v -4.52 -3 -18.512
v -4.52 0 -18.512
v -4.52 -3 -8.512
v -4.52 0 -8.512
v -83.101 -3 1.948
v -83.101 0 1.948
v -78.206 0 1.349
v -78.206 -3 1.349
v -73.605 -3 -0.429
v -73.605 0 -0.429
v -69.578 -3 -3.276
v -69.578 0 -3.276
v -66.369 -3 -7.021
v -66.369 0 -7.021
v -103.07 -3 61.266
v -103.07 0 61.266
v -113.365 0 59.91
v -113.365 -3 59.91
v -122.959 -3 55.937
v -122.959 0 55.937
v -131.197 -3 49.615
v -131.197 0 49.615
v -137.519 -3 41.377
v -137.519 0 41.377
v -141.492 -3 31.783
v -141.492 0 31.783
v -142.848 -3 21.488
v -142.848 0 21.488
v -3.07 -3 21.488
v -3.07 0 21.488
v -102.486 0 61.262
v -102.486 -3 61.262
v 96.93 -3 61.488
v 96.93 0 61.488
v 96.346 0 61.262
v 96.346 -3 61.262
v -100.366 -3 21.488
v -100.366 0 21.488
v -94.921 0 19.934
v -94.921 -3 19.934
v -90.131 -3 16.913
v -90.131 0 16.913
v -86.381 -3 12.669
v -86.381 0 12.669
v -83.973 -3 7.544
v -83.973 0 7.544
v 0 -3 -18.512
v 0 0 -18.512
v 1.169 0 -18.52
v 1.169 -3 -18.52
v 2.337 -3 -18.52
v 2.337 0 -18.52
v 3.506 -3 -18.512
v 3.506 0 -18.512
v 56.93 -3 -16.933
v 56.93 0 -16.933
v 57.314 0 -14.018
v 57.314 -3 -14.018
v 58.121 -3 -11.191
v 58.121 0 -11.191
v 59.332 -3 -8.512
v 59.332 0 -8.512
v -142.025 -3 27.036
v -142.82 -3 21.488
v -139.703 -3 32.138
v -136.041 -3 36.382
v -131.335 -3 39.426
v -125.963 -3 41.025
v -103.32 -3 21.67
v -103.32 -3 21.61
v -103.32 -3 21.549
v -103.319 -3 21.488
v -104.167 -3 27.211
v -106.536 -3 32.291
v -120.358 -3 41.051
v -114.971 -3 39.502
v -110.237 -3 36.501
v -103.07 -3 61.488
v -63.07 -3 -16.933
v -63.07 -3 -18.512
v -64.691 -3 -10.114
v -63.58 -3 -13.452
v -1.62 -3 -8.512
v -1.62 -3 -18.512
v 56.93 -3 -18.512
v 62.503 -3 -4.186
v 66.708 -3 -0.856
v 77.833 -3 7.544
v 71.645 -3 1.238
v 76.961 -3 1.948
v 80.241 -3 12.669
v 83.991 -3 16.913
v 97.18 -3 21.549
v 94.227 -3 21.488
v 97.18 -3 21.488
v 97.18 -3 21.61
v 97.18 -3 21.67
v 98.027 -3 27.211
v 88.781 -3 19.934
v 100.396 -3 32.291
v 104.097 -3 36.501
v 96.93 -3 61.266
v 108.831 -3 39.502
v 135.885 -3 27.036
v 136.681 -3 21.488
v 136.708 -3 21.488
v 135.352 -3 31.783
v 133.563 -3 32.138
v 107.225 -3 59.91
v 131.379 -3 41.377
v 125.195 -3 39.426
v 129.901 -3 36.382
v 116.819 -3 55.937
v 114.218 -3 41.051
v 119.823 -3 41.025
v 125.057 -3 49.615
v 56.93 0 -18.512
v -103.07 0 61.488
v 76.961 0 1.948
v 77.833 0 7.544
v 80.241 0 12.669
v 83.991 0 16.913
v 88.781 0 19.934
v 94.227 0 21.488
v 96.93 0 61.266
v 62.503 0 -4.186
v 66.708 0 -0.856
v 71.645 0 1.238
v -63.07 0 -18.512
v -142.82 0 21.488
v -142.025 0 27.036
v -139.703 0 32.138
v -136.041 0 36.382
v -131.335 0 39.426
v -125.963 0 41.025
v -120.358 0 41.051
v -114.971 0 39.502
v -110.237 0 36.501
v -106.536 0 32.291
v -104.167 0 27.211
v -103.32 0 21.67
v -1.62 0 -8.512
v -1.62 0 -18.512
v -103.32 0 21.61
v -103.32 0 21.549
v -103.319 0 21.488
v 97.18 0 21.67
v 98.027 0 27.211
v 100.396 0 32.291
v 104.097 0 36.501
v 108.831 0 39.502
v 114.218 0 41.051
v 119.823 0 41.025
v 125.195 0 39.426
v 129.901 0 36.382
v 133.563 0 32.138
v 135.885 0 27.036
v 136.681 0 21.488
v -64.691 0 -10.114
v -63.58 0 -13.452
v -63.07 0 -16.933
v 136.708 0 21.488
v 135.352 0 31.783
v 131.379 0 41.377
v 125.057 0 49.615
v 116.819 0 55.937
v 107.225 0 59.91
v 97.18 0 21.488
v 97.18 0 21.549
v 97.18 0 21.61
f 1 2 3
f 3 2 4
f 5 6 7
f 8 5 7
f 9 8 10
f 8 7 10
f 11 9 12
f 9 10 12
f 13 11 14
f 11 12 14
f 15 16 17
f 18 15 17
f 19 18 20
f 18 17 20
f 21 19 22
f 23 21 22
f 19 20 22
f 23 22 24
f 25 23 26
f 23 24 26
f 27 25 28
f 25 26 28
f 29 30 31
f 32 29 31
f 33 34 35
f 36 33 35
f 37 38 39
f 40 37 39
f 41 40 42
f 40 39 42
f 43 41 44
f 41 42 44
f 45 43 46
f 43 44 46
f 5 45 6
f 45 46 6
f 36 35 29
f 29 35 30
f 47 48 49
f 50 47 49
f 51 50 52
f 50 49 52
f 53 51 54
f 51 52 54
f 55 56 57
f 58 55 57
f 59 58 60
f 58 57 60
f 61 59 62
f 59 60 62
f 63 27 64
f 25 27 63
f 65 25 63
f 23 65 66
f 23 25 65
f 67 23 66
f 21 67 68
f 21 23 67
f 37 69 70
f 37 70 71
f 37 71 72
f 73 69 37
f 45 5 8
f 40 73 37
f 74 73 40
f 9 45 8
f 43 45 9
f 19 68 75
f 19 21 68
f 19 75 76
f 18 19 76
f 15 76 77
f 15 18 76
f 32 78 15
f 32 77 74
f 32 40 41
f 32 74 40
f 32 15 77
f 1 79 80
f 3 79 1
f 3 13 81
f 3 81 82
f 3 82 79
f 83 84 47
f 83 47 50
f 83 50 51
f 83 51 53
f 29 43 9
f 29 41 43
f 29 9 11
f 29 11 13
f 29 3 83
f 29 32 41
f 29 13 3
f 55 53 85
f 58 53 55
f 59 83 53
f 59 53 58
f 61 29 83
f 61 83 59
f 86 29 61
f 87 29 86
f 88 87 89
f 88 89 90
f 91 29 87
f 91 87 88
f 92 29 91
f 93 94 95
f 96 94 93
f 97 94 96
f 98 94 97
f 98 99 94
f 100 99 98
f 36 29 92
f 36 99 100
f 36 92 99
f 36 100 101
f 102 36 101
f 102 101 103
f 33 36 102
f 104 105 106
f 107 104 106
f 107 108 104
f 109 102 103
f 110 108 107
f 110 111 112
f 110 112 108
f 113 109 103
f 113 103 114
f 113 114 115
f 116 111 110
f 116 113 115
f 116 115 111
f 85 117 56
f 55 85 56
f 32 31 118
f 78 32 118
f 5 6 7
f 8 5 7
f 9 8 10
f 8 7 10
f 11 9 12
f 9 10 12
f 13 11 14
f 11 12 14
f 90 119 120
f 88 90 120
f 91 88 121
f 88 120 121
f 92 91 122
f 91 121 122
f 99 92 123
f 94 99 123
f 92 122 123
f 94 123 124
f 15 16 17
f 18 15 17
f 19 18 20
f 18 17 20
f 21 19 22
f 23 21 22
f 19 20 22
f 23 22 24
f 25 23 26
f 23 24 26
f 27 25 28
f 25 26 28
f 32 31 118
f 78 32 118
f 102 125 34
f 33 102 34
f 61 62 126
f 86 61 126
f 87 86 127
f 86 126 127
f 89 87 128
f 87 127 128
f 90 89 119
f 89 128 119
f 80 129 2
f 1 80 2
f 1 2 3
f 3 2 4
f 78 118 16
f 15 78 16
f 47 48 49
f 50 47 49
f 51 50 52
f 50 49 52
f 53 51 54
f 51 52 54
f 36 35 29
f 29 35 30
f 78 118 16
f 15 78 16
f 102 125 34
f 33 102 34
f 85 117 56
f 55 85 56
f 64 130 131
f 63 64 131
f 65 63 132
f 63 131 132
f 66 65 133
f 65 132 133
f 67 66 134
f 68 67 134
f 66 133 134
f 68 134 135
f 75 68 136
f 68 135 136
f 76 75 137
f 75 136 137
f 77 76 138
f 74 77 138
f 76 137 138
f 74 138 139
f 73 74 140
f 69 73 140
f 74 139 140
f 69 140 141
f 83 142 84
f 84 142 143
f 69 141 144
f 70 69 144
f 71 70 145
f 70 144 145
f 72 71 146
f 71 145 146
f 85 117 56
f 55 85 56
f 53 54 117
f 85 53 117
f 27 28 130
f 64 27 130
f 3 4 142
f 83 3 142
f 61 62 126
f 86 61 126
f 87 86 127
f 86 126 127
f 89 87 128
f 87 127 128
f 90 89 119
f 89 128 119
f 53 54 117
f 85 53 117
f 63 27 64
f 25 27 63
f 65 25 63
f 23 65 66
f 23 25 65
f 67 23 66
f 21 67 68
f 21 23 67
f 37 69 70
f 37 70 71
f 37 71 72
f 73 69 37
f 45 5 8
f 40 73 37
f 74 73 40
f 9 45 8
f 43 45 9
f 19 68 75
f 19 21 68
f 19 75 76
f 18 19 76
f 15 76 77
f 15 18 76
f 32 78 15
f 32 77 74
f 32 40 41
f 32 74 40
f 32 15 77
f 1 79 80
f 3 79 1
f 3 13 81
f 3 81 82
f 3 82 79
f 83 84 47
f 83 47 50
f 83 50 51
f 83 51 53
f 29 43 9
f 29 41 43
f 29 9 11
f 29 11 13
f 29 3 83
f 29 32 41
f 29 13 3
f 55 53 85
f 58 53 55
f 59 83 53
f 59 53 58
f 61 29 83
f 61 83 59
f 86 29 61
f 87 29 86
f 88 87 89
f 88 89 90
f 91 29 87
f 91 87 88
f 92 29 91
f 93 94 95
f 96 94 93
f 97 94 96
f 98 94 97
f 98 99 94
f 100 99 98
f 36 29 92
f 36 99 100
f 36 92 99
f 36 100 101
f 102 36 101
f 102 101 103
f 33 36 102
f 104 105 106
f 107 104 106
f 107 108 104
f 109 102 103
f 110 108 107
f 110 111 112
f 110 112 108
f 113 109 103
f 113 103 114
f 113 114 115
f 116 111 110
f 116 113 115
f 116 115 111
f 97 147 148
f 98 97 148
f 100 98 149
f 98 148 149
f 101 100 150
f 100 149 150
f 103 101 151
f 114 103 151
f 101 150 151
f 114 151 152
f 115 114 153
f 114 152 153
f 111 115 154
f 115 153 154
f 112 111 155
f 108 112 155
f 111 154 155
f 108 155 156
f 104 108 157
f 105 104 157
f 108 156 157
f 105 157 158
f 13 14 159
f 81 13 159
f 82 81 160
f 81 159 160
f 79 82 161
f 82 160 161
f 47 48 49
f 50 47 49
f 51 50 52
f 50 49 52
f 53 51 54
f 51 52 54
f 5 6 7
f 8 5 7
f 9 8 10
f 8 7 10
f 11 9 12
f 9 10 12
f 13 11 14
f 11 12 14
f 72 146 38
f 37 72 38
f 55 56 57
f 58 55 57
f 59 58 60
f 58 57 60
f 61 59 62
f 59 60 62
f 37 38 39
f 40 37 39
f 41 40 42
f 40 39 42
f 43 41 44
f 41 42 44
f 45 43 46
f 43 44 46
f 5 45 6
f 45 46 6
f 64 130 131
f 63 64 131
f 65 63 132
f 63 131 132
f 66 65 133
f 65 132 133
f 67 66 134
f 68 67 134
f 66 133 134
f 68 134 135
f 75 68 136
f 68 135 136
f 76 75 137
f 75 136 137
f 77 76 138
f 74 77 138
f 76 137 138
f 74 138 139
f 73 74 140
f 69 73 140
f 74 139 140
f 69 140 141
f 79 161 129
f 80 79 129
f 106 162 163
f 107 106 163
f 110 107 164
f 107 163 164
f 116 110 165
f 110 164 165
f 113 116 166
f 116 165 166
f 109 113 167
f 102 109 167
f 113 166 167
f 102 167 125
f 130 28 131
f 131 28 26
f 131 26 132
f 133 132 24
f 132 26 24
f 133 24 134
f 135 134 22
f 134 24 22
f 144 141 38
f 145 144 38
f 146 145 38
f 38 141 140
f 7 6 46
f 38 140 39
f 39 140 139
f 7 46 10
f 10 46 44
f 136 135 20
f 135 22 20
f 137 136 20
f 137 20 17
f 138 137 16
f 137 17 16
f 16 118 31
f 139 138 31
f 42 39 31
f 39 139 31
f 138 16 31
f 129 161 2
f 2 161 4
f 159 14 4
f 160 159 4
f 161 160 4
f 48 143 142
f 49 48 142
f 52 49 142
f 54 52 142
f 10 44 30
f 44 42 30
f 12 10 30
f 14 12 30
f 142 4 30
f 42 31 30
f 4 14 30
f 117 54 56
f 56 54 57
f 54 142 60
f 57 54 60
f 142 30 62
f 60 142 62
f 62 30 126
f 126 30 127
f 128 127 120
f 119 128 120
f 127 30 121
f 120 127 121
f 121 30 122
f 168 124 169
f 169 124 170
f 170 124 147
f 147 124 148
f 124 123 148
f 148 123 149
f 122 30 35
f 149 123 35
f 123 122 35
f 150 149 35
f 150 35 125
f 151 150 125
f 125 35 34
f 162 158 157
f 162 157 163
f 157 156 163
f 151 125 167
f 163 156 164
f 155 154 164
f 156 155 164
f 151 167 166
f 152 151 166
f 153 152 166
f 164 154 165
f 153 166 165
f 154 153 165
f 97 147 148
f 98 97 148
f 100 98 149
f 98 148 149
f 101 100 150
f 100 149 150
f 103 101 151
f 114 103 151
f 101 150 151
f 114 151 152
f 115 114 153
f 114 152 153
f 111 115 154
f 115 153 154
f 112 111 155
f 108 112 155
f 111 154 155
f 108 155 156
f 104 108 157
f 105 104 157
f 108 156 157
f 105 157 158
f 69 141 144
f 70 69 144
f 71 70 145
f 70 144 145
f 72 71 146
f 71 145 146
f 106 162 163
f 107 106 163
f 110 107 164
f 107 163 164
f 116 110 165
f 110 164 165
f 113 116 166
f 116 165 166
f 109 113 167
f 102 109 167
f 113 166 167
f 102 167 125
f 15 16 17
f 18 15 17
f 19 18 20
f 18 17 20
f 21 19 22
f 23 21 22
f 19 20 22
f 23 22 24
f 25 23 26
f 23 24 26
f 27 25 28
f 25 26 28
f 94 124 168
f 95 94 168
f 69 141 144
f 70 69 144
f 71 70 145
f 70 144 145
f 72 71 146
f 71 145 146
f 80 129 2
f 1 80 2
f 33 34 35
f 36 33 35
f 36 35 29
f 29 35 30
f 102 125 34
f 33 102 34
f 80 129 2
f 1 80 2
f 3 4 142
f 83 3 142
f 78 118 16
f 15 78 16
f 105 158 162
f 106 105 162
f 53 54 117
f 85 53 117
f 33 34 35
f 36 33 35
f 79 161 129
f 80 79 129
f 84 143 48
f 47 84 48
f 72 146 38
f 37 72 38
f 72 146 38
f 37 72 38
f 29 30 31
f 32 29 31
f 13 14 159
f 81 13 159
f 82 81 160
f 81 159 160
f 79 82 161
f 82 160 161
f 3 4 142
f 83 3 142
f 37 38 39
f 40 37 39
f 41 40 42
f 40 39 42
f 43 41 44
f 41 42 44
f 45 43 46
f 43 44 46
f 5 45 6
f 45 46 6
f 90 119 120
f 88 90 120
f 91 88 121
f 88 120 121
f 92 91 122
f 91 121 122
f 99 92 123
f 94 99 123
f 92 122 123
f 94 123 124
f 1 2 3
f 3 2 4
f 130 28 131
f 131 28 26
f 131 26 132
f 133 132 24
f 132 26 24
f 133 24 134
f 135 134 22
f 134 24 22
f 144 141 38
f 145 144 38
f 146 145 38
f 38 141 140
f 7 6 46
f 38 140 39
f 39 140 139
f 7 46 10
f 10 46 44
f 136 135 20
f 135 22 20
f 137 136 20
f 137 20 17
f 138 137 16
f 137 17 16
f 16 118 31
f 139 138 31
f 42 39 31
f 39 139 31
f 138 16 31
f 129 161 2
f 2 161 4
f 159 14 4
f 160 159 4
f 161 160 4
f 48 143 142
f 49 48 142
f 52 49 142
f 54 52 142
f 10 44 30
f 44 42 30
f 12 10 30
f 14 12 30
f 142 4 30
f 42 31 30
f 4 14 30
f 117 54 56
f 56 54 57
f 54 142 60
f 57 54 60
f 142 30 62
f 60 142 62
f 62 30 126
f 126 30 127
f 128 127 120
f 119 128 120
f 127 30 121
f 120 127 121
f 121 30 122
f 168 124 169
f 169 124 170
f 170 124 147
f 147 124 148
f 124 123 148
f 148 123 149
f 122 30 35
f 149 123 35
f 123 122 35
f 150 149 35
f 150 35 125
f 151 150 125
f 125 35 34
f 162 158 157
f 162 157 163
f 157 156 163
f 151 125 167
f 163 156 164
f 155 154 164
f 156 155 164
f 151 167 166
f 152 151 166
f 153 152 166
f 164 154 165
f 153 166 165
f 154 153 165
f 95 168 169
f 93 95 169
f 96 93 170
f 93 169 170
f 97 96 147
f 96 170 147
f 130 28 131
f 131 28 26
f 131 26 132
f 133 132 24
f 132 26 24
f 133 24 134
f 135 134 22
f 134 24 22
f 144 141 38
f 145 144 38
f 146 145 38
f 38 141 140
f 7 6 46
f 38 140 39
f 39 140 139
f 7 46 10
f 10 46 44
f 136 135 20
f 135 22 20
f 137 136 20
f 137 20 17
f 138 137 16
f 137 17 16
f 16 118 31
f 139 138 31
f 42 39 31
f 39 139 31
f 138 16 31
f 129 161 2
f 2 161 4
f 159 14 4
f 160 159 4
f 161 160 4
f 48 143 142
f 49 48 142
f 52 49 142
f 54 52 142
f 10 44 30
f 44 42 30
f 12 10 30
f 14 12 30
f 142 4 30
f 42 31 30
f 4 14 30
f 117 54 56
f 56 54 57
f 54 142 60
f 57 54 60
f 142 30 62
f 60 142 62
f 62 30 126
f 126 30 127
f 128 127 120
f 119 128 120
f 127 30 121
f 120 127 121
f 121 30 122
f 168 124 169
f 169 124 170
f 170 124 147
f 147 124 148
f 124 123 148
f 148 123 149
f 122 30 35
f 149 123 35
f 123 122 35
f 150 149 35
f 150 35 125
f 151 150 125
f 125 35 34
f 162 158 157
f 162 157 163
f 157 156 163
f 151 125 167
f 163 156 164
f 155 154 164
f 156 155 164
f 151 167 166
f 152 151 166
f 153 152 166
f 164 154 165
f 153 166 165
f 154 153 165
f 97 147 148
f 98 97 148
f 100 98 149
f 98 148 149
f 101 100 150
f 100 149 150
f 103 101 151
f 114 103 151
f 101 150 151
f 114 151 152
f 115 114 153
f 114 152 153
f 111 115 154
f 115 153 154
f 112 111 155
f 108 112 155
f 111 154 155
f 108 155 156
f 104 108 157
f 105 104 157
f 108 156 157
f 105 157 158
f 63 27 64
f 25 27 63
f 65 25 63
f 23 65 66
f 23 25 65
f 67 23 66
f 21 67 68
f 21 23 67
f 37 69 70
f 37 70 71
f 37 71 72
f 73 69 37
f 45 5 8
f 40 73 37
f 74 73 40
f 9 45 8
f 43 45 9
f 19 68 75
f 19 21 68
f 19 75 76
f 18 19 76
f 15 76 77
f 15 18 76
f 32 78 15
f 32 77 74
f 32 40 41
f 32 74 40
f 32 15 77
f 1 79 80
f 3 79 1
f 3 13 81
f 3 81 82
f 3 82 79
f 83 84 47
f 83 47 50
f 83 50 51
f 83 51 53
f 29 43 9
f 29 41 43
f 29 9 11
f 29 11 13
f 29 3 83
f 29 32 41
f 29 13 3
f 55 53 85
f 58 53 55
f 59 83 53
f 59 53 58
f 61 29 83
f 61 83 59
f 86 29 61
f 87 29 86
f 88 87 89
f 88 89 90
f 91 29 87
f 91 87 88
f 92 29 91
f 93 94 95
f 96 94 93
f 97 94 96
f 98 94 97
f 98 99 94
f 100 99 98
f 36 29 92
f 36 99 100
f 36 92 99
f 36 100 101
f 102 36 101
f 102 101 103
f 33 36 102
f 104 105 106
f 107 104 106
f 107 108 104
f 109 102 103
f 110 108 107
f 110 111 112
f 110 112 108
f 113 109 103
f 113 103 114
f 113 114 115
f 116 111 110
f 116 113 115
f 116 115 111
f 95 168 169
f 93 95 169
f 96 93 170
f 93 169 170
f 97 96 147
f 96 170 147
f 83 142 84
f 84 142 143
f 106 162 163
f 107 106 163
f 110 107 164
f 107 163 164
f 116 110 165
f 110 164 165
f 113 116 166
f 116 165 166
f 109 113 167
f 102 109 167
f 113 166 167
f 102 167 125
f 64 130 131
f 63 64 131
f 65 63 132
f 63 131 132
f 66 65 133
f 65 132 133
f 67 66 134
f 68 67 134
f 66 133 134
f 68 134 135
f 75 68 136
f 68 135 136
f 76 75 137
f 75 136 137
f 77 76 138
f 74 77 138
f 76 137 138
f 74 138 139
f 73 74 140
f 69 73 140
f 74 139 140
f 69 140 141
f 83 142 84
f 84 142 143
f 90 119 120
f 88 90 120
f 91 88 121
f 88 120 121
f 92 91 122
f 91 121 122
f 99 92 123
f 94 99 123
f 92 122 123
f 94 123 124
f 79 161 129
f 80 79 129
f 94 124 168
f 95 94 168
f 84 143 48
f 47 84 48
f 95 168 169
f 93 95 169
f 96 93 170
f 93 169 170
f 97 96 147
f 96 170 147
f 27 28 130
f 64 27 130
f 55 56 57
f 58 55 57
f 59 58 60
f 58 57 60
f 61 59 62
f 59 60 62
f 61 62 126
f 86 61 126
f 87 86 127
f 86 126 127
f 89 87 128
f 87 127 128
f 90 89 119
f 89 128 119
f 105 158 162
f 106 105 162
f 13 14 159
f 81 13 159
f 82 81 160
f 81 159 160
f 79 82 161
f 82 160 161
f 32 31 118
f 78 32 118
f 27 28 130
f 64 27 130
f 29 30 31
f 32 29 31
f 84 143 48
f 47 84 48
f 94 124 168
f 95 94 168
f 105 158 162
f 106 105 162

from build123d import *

# Parameters (mm, degrees)
F1_DEPTH = 3
F2_DEPTH = 3
F3_DEPTH = 3


with BuildPart() as f1:
    # F0 (on Front) → F1 (new body)
    with BuildSketch(Plane.XZ):
        with BuildLine():
            Line((-63.069923, -8.252302), (-63.069923, 21.488009))
            Line((-63.069923, 21.488009), (-3.069923, 21.488009))
            Line((-3.069923, 21.488009), (-102.48633, 61.261525))
            ThreePointArc((-102.48633, 61.261525), (-102.778119, 61.264736), (-103.069923, 61.265806))
            ThreePointArc((-103.069923, 61.265806), (-131.197073, 49.615159), (-142.84772, 21.488009))
            Line((-142.84772, 21.488009), (-142.820399, 21.488009))
            ThreePointArc((-142.820399, 21.488009), (-123.16106, 41.238275), (-103.320288, 21.670281))
            ThreePointArc((-103.320288, 21.670281), (-103.195108, 21.671458), (-103.069923, 21.67185))
            ThreePointArc((-103.069923, 21.67185), (-101.715046, 21.625837), (-100.366413, 21.488009))
            ThreePointArc((-100.366413, 21.488009), (-88.104601, 14.924745), (-83.101084, 1.948101))
            ThreePointArc((-83.101084, 1.948101), (-73.605168, -0.428708), (-66.369074, -7.021171))
            ThreePointArc((-66.369074, -7.021171), (-64.722646, -7.64517), (-63.069923, -8.252302))
        make_face()
        with BuildLine():
            Line((-3.069923, 21.488009), (-63.069923, 21.488009))
            Line((-63.069923, 21.488009), (-63.069923, -8.252302))
            ThreePointArc((-63.069923, -8.252302), (-34.240975, -15.927676), (-4.519923, -18.511991))
            Line((-4.519923, -18.511991), (-4.519923, -8.511991))
            Line((-4.519923, -8.511991), (-3.069923, -8.511991))
            Line((-3.069923, -8.511991), (-3.069923, 21.488009))
        make_face()
        with BuildLine():
            Line((96.346485, 61.261525), (-3.069923, 21.488009))
            Line((-3.069923, 21.488009), (56.930077, 21.488009))
            Line((56.930077, 21.488009), (56.930077, -9.352978))
            ThreePointArc((56.930077, -9.352978), (58.132721, -8.936963), (59.33223, -8.511991))
            ThreePointArc((59.33223, -8.511991), (66.707529, -0.856368), (76.961238, 1.948101))
            ThreePointArc((76.961238, 1.948101), (81.964756, 14.924745), (94.226567, 21.488009))
            ThreePointArc((94.226567, 21.488009), (95.5752, 21.625837), (96.930077, 21.67185))
            ThreePointArc((96.930077, 21.67185), (97.055262, 21.671458), (97.180442, 21.670281))
            ThreePointArc((97.180442, 21.670281), (117.021214, 41.238275), (136.680553, 21.488009))
            Line((136.680553, 21.488009), (136.707874, 21.488009))
            ThreePointArc((136.707874, 21.488009), (125.057227, 49.615159), (96.930077, 61.265806))
            ThreePointArc((96.930077, 61.265806), (96.638273, 61.264736), (96.346485, 61.261525))
        make_face()
        with BuildLine():
            Line((56.930077, 21.488009), (-3.069923, 21.488009))
            Line((-3.069923, 21.488009), (-3.069923, -8.511991))
            Line((-3.069923, -8.511991), (-1.619923, -8.511991))
            Line((-1.619923, -8.511991), (-1.619923, -18.511991))
            Line((-1.619923, -18.511991), (0, -18.511991))
            Line((0, -18.511991), (3.505662, -18.511991))
            ThreePointArc((3.505662, -18.511991), (30.583896, -16.067511), (56.930077, -9.352978))
            Line((56.930077, -9.352978), (56.930077, 21.488009))
        make_face()
        with BuildLine():
            ThreePointArc((-4.519923, -18.511991), (-34.240975, -15.927676), (-63.069923, -8.252302))
            Line((-63.069923, -8.252302), (-63.069923, -16.932933))
            ThreePointArc((-63.069923, -16.932933), (-63.040054, -17.72218), (-63.041318, -18.511991))
            Line((-63.041318, -18.511991), (-4.519923, -18.511991))
        make_face()
        with BuildLine():
            Line((-63.069923, -16.932933), (-63.069923, -8.252302))
            ThreePointArc((-63.069923, -8.252302), (-64.722646, -7.64517), (-66.369074, -7.021171))
            ThreePointArc((-66.369074, -7.021171), (-64.062061, -11.758223), (-63.069923, -16.932933))
        make_face()
        with BuildLine():
            ThreePointArc((-103.069923, 61.265806), (-102.778119, 61.264736), (-102.48633, 61.261525))
            Line((-102.48633, 61.261525), (-103.069923, 61.488009))
            Line((-103.069923, 61.488009), (-103.069923, 61.265806))
        make_face()
        with BuildLine():
            Line((96.930077, 61.488009), (96.346485, 61.261525))
            ThreePointArc((96.346485, 61.261525), (96.638273, 61.264736), (96.930077, 61.265806))
            Line((96.930077, 61.265806), (96.930077, 61.488009))
        make_face()
        with BuildLine():
            ThreePointArc((-63.041318, -18.511991), (-63.040054, -17.72218), (-63.069923, -16.932933))
            Line((-63.069923, -16.932933), (-63.069923, -18.085031))
            Line((-63.069923, -18.085031), (-63.069923, -18.511991))
            Line((-63.069923, -18.511991), (-63.041318, -18.511991))
        make_face()
        with BuildLine():
            ThreePointArc((59.33223, -8.511991), (58.132721, -8.936963), (56.930077, -9.352978))
            Line((56.930077, -9.352978), (56.930077, -16.932933))
            ThreePointArc((56.930077, -16.932933), (57.665405, -12.589603), (59.33223, -8.511991))
        make_face()
        with BuildLine():
            Line((56.930077, -16.932933), (56.930077, -9.352978))
            ThreePointArc((56.930077, -9.352978), (30.583896, -16.067511), (3.505662, -18.511991))
            Line((3.505662, -18.511991), (56.901472, -18.511991))
            ThreePointArc((56.901472, -18.511991), (56.900208, -17.72218), (56.930077, -16.932933))
        make_face()
        with BuildLine():
            Line((56.930077, -18.085031), (56.930077, -16.932933))
            ThreePointArc((56.930077, -16.932933), (56.900208, -17.72218), (56.901472, -18.511991))
            Line((56.901472, -18.511991), (56.930077, -18.511991))
            Line((56.930077, -18.511991), (56.930077, -18.085031))
        make_face()
        with BuildLine():
            ThreePointArc((0, -18.511991), (1.752831, -18.520995), (3.505662, -18.511991))
            Line((3.505662, -18.511991), (0, -18.511991))
        make_face()
        with BuildLine():
            Line((-103.069923, 21.488009), (-100.366413, 21.488009))
            ThreePointArc((-100.366413, 21.488009), (-101.715046, 21.625837), (-103.069923, 21.67185))
            Line((-103.069923, 21.67185), (-103.069923, 21.488009))
        make_face()
        with BuildLine():
            Line((-103.069923, 21.488009), (-103.069923, 21.67185))
            ThreePointArc((-103.069923, 21.67185), (-103.195108, 21.671458), (-103.320288, 21.670281))
            ThreePointArc((-103.320288, 21.670281), (-103.319657, 21.579146), (-103.319447, 21.488009))
            Line((-103.319447, 21.488009), (-103.069923, 21.488009))
        make_face()
        with BuildLine():
            ThreePointArc((96.930077, 21.67185), (95.5752, 21.625837), (94.226567, 21.488009))
            Line((94.226567, 21.488009), (96.930077, 21.488009))
            Line((96.930077, 21.488009), (96.930077, 21.67185))
        make_face()
        with BuildLine():
            ThreePointArc((97.179601, 21.488009), (97.179811, 21.579146), (97.180442, 21.670281))
            ThreePointArc((97.180442, 21.670281), (97.055262, 21.671458), (96.930077, 21.67185))
            Line((96.930077, 21.67185), (96.930077, 21.488009))
            Line((96.930077, 21.488009), (97.179601, 21.488009))
        make_face()
    extrude(amount=F1_DEPTH)


with BuildPart() as f2:
    # F0 (on Front) → F2 (new body)
    with BuildSketch(Plane.XZ):
        with BuildLine():
            Line((-63.069923, -8.252302), (-63.069923, 21.488009))
            Line((-63.069923, 21.488009), (-3.069923, 21.488009))
            Line((-3.069923, 21.488009), (-102.48633, 61.261525))
            ThreePointArc((-102.48633, 61.261525), (-102.778119, 61.264736), (-103.069923, 61.265806))
            ThreePointArc((-103.069923, 61.265806), (-131.197073, 49.615159), (-142.84772, 21.488009))
            Line((-142.84772, 21.488009), (-142.820399, 21.488009))
            ThreePointArc((-142.820399, 21.488009), (-123.16106, 41.238275), (-103.320288, 21.670281))
            ThreePointArc((-103.320288, 21.670281), (-103.195108, 21.671458), (-103.069923, 21.67185))
            ThreePointArc((-103.069923, 21.67185), (-101.715046, 21.625837), (-100.366413, 21.488009))
            ThreePointArc((-100.366413, 21.488009), (-88.104601, 14.924745), (-83.101084, 1.948101))
            ThreePointArc((-83.101084, 1.948101), (-73.605168, -0.428708), (-66.369074, -7.021171))
            ThreePointArc((-66.369074, -7.021171), (-64.722646, -7.64517), (-63.069923, -8.252302))
        make_face()
        with BuildLine():
            Line((-3.069923, 21.488009), (-63.069923, 21.488009))
            Line((-63.069923, 21.488009), (-63.069923, -8.252302))
            ThreePointArc((-63.069923, -8.252302), (-34.240975, -15.927676), (-4.519923, -18.511991))
            Line((-4.519923, -18.511991), (-4.519923, -8.511991))
            Line((-4.519923, -8.511991), (-3.069923, -8.511991))
            Line((-3.069923, -8.511991), (-3.069923, 21.488009))
        make_face()
        with BuildLine():
            Line((96.346485, 61.261525), (-3.069923, 21.488009))
            Line((-3.069923, 21.488009), (56.930077, 21.488009))
            Line((56.930077, 21.488009), (56.930077, -9.352978))
            ThreePointArc((56.930077, -9.352978), (58.132721, -8.936963), (59.33223, -8.511991))
            ThreePointArc((59.33223, -8.511991), (66.707529, -0.856368), (76.961238, 1.948101))
            ThreePointArc((76.961238, 1.948101), (81.964756, 14.924745), (94.226567, 21.488009))
            ThreePointArc((94.226567, 21.488009), (95.5752, 21.625837), (96.930077, 21.67185))
            ThreePointArc((96.930077, 21.67185), (97.055262, 21.671458), (97.180442, 21.670281))
            ThreePointArc((97.180442, 21.670281), (117.021214, 41.238275), (136.680553, 21.488009))
            Line((136.680553, 21.488009), (136.707874, 21.488009))
            ThreePointArc((136.707874, 21.488009), (125.057227, 49.615159), (96.930077, 61.265806))
            ThreePointArc((96.930077, 61.265806), (96.638273, 61.264736), (96.346485, 61.261525))
        make_face()
        with BuildLine():
            Line((56.930077, 21.488009), (-3.069923, 21.488009))
            Line((-3.069923, 21.488009), (-3.069923, -8.511991))
            Line((-3.069923, -8.511991), (-1.619923, -8.511991))
            Line((-1.619923, -8.511991), (-1.619923, -18.511991))
            Line((-1.619923, -18.511991), (0, -18.511991))
            Line((0, -18.511991), (3.505662, -18.511991))
            ThreePointArc((3.505662, -18.511991), (30.583896, -16.067511), (56.930077, -9.352978))
            Line((56.930077, -9.352978), (56.930077, 21.488009))
        make_face()
        with BuildLine():
            ThreePointArc((-4.519923, -18.511991), (-34.240975, -15.927676), (-63.069923, -8.252302))
            Line((-63.069923, -8.252302), (-63.069923, -16.932933))
            ThreePointArc((-63.069923, -16.932933), (-63.040054, -17.72218), (-63.041318, -18.511991))
            Line((-63.041318, -18.511991), (-4.519923, -18.511991))
        make_face()
        with BuildLine():
            Line((-63.069923, -16.932933), (-63.069923, -8.252302))
            ThreePointArc((-63.069923, -8.252302), (-64.722646, -7.64517), (-66.369074, -7.021171))
            ThreePointArc((-66.369074, -7.021171), (-64.062061, -11.758223), (-63.069923, -16.932933))
        make_face()
        with BuildLine():
            ThreePointArc((-103.069923, 61.265806), (-102.778119, 61.264736), (-102.48633, 61.261525))
            Line((-102.48633, 61.261525), (-103.069923, 61.488009))
            Line((-103.069923, 61.488009), (-103.069923, 61.265806))
        make_face()
        with BuildLine():
            Line((96.930077, 61.488009), (96.346485, 61.261525))
            ThreePointArc((96.346485, 61.261525), (96.638273, 61.264736), (96.930077, 61.265806))
            Line((96.930077, 61.265806), (96.930077, 61.488009))
        make_face()
        with BuildLine():
            ThreePointArc((-63.041318, -18.511991), (-63.040054, -17.72218), (-63.069923, -16.932933))
            Line((-63.069923, -16.932933), (-63.069923, -18.085031))
            Line((-63.069923, -18.085031), (-63.069923, -18.511991))
            Line((-63.069923, -18.511991), (-63.041318, -18.511991))
        make_face()
        with BuildLine():
            ThreePointArc((59.33223, -8.511991), (58.132721, -8.936963), (56.930077, -9.352978))
            Line((56.930077, -9.352978), (56.930077, -16.932933))
            ThreePointArc((56.930077, -16.932933), (57.665405, -12.589603), (59.33223, -8.511991))
        make_face()
        with BuildLine():
            Line((56.930077, -16.932933), (56.930077, -9.352978))
            ThreePointArc((56.930077, -9.352978), (30.583896, -16.067511), (3.505662, -18.511991))
            Line((3.505662, -18.511991), (56.901472, -18.511991))
            ThreePointArc((56.901472, -18.511991), (56.900208, -17.72218), (56.930077, -16.932933))
        make_face()
        with BuildLine():
            Line((56.930077, -18.085031), (56.930077, -16.932933))
            ThreePointArc((56.930077, -16.932933), (56.900208, -17.72218), (56.901472, -18.511991))
            Line((56.901472, -18.511991), (56.930077, -18.511991))
            Line((56.930077, -18.511991), (56.930077, -18.085031))
        make_face()
        with BuildLine():
            ThreePointArc((0, -18.511991), (1.752831, -18.520995), (3.505662, -18.511991))
            Line((3.505662, -18.511991), (0, -18.511991))
        make_face()
        with BuildLine():
            Line((-103.069923, 21.488009), (-100.366413, 21.488009))
            ThreePointArc((-100.366413, 21.488009), (-101.715046, 21.625837), (-103.069923, 21.67185))
            Line((-103.069923, 21.67185), (-103.069923, 21.488009))
        make_face()
        with BuildLine():
            Line((-103.069923, 21.488009), (-103.069923, 21.67185))
            ThreePointArc((-103.069923, 21.67185), (-103.195108, 21.671458), (-103.320288, 21.670281))
            ThreePointArc((-103.320288, 21.670281), (-103.319657, 21.579146), (-103.319447, 21.488009))
            Line((-103.319447, 21.488009), (-103.069923, 21.488009))
        make_face()
        with BuildLine():
            ThreePointArc((96.930077, 21.67185), (95.5752, 21.625837), (94.226567, 21.488009))
            Line((94.226567, 21.488009), (96.930077, 21.488009))
            Line((96.930077, 21.488009), (96.930077, 21.67185))
        make_face()
        with BuildLine():
            ThreePointArc((97.179601, 21.488009), (97.179811, 21.579146), (97.180442, 21.670281))
            ThreePointArc((97.180442, 21.670281), (97.055262, 21.671458), (96.930077, 21.67185))
            Line((96.930077, 21.67185), (96.930077, 21.488009))
            Line((96.930077, 21.488009), (97.179601, 21.488009))
        make_face()
    extrude(amount=F2_DEPTH)


with BuildPart() as f3:
    # F0 (on Front) → F3 (new body)
    with BuildSketch(Plane.XZ):
        with BuildLine():
            Line((-63.069923, -8.252302), (-63.069923, 21.488009))
            Line((-63.069923, 21.488009), (-3.069923, 21.488009))
            Line((-3.069923, 21.488009), (-102.48633, 61.261525))
            ThreePointArc((-102.48633, 61.261525), (-102.778119, 61.264736), (-103.069923, 61.265806))
            ThreePointArc((-103.069923, 61.265806), (-131.197073, 49.615159), (-142.84772, 21.488009))
            Line((-142.84772, 21.488009), (-142.820399, 21.488009))
            ThreePointArc((-142.820399, 21.488009), (-123.16106, 41.238275), (-103.320288, 21.670281))
            ThreePointArc((-103.320288, 21.670281), (-103.195108, 21.671458), (-103.069923, 21.67185))
            ThreePointArc((-103.069923, 21.67185), (-101.715046, 21.625837), (-100.366413, 21.488009))
            ThreePointArc((-100.366413, 21.488009), (-88.104601, 14.924745), (-83.101084, 1.948101))
            ThreePointArc((-83.101084, 1.948101), (-73.605168, -0.428708), (-66.369074, -7.021171))
            ThreePointArc((-66.369074, -7.021171), (-64.722646, -7.64517), (-63.069923, -8.252302))
        make_face()
        with BuildLine():
            Line((-3.069923, 21.488009), (-63.069923, 21.488009))
            Line((-63.069923, 21.488009), (-63.069923, -8.252302))
            ThreePointArc((-63.069923, -8.252302), (-34.240975, -15.927676), (-4.519923, -18.511991))
            Line((-4.519923, -18.511991), (-4.519923, -8.511991))
            Line((-4.519923, -8.511991), (-3.069923, -8.511991))
            Line((-3.069923, -8.511991), (-3.069923, 21.488009))
        make_face()
        with BuildLine():
            Line((96.346485, 61.261525), (-3.069923, 21.488009))
            Line((-3.069923, 21.488009), (56.930077, 21.488009))
            Line((56.930077, 21.488009), (56.930077, -9.352978))
            ThreePointArc((56.930077, -9.352978), (58.132721, -8.936963), (59.33223, -8.511991))
            ThreePointArc((59.33223, -8.511991), (66.707529, -0.856368), (76.961238, 1.948101))
            ThreePointArc((76.961238, 1.948101), (81.964756, 14.924745), (94.226567, 21.488009))
            ThreePointArc((94.226567, 21.488009), (95.5752, 21.625837), (96.930077, 21.67185))
            ThreePointArc((96.930077, 21.67185), (97.055262, 21.671458), (97.180442, 21.670281))
            ThreePointArc((97.180442, 21.670281), (117.021214, 41.238275), (136.680553, 21.488009))
            Line((136.680553, 21.488009), (136.707874, 21.488009))
            ThreePointArc((136.707874, 21.488009), (125.057227, 49.615159), (96.930077, 61.265806))
            ThreePointArc((96.930077, 61.265806), (96.638273, 61.264736), (96.346485, 61.261525))
        make_face()
        with BuildLine():
            Line((56.930077, 21.488009), (-3.069923, 21.488009))
            Line((-3.069923, 21.488009), (-3.069923, -8.511991))
            Line((-3.069923, -8.511991), (-1.619923, -8.511991))
            Line((-1.619923, -8.511991), (-1.619923, -18.511991))
            Line((-1.619923, -18.511991), (0, -18.511991))
            Line((0, -18.511991), (3.505662, -18.511991))
            ThreePointArc((3.505662, -18.511991), (30.583896, -16.067511), (56.930077, -9.352978))
            Line((56.930077, -9.352978), (56.930077, 21.488009))
        make_face()
        with BuildLine():
            ThreePointArc((-4.519923, -18.511991), (-34.240975, -15.927676), (-63.069923, -8.252302))
            Line((-63.069923, -8.252302), (-63.069923, -16.932933))
            ThreePointArc((-63.069923, -16.932933), (-63.040054, -17.72218), (-63.041318, -18.511991))
            Line((-63.041318, -18.511991), (-4.519923, -18.511991))
        make_face()
        with BuildLine():
            Line((-63.069923, -16.932933), (-63.069923, -8.252302))
            ThreePointArc((-63.069923, -8.252302), (-64.722646, -7.64517), (-66.369074, -7.021171))
            ThreePointArc((-66.369074, -7.021171), (-64.062061, -11.758223), (-63.069923, -16.932933))
        make_face()
        with BuildLine():
            ThreePointArc((-103.069923, 61.265806), (-102.778119, 61.264736), (-102.48633, 61.261525))
            Line((-102.48633, 61.261525), (-103.069923, 61.488009))
            Line((-103.069923, 61.488009), (-103.069923, 61.265806))
        make_face()
        with BuildLine():
            Line((96.930077, 61.488009), (96.346485, 61.261525))
            ThreePointArc((96.346485, 61.261525), (96.638273, 61.264736), (96.930077, 61.265806))
            Line((96.930077, 61.265806), (96.930077, 61.488009))
        make_face()
        with BuildLine():
            ThreePointArc((-63.041318, -18.511991), (-63.040054, -17.72218), (-63.069923, -16.932933))
            Line((-63.069923, -16.932933), (-63.069923, -18.085031))
            Line((-63.069923, -18.085031), (-63.069923, -18.511991))
            Line((-63.069923, -18.511991), (-63.041318, -18.511991))
        make_face()
        with BuildLine():
            ThreePointArc((59.33223, -8.511991), (58.132721, -8.936963), (56.930077, -9.352978))
            Line((56.930077, -9.352978), (56.930077, -16.932933))
            ThreePointArc((56.930077, -16.932933), (57.665405, -12.589603), (59.33223, -8.511991))
        make_face()
        with BuildLine():
            Line((56.930077, -16.932933), (56.930077, -9.352978))
            ThreePointArc((56.930077, -9.352978), (30.583896, -16.067511), (3.505662, -18.511991))
            Line((3.505662, -18.511991), (56.901472, -18.511991))
            ThreePointArc((56.901472, -18.511991), (56.900208, -17.72218), (56.930077, -16.932933))
        make_face()
        with BuildLine():
            Line((56.930077, -18.085031), (56.930077, -16.932933))
            ThreePointArc((56.930077, -16.932933), (56.900208, -17.72218), (56.901472, -18.511991))
            Line((56.901472, -18.511991), (56.930077, -18.511991))
            Line((56.930077, -18.511991), (56.930077, -18.085031))
        make_face()
        with BuildLine():
            ThreePointArc((0, -18.511991), (1.752831, -18.520995), (3.505662, -18.511991))
            Line((3.505662, -18.511991), (0, -18.511991))
        make_face()
        with BuildLine():
            Line((-103.069923, 21.488009), (-100.366413, 21.488009))
            ThreePointArc((-100.366413, 21.488009), (-101.715046, 21.625837), (-103.069923, 21.67185))
            Line((-103.069923, 21.67185), (-103.069923, 21.488009))
        make_face()
        with BuildLine():
            Line((-103.069923, 21.488009), (-103.069923, 21.67185))
            ThreePointArc((-103.069923, 21.67185), (-103.195108, 21.671458), (-103.320288, 21.670281))
            ThreePointArc((-103.320288, 21.670281), (-103.319657, 21.579146), (-103.319447, 21.488009))
            Line((-103.319447, 21.488009), (-103.069923, 21.488009))
        make_face()
        with BuildLine():
            ThreePointArc((96.930077, 21.67185), (95.5752, 21.625837), (94.226567, 21.488009))
            Line((94.226567, 21.488009), (96.930077, 21.488009))
            Line((96.930077, 21.488009), (96.930077, 21.67185))
        make_face()
        with BuildLine():
            ThreePointArc((97.179601, 21.488009), (97.179811, 21.579146), (97.180442, 21.670281))
            ThreePointArc((97.180442, 21.670281), (97.055262, 21.671458), (96.930077, 21.67185))
            Line((96.930077, 21.67185), (96.930077, 21.488009))
            Line((96.930077, 21.488009), (97.179601, 21.488009))
        make_face()
    extrude(amount=F3_DEPTH)


solid = Compound([f1.part, f2.part, f3.part])
